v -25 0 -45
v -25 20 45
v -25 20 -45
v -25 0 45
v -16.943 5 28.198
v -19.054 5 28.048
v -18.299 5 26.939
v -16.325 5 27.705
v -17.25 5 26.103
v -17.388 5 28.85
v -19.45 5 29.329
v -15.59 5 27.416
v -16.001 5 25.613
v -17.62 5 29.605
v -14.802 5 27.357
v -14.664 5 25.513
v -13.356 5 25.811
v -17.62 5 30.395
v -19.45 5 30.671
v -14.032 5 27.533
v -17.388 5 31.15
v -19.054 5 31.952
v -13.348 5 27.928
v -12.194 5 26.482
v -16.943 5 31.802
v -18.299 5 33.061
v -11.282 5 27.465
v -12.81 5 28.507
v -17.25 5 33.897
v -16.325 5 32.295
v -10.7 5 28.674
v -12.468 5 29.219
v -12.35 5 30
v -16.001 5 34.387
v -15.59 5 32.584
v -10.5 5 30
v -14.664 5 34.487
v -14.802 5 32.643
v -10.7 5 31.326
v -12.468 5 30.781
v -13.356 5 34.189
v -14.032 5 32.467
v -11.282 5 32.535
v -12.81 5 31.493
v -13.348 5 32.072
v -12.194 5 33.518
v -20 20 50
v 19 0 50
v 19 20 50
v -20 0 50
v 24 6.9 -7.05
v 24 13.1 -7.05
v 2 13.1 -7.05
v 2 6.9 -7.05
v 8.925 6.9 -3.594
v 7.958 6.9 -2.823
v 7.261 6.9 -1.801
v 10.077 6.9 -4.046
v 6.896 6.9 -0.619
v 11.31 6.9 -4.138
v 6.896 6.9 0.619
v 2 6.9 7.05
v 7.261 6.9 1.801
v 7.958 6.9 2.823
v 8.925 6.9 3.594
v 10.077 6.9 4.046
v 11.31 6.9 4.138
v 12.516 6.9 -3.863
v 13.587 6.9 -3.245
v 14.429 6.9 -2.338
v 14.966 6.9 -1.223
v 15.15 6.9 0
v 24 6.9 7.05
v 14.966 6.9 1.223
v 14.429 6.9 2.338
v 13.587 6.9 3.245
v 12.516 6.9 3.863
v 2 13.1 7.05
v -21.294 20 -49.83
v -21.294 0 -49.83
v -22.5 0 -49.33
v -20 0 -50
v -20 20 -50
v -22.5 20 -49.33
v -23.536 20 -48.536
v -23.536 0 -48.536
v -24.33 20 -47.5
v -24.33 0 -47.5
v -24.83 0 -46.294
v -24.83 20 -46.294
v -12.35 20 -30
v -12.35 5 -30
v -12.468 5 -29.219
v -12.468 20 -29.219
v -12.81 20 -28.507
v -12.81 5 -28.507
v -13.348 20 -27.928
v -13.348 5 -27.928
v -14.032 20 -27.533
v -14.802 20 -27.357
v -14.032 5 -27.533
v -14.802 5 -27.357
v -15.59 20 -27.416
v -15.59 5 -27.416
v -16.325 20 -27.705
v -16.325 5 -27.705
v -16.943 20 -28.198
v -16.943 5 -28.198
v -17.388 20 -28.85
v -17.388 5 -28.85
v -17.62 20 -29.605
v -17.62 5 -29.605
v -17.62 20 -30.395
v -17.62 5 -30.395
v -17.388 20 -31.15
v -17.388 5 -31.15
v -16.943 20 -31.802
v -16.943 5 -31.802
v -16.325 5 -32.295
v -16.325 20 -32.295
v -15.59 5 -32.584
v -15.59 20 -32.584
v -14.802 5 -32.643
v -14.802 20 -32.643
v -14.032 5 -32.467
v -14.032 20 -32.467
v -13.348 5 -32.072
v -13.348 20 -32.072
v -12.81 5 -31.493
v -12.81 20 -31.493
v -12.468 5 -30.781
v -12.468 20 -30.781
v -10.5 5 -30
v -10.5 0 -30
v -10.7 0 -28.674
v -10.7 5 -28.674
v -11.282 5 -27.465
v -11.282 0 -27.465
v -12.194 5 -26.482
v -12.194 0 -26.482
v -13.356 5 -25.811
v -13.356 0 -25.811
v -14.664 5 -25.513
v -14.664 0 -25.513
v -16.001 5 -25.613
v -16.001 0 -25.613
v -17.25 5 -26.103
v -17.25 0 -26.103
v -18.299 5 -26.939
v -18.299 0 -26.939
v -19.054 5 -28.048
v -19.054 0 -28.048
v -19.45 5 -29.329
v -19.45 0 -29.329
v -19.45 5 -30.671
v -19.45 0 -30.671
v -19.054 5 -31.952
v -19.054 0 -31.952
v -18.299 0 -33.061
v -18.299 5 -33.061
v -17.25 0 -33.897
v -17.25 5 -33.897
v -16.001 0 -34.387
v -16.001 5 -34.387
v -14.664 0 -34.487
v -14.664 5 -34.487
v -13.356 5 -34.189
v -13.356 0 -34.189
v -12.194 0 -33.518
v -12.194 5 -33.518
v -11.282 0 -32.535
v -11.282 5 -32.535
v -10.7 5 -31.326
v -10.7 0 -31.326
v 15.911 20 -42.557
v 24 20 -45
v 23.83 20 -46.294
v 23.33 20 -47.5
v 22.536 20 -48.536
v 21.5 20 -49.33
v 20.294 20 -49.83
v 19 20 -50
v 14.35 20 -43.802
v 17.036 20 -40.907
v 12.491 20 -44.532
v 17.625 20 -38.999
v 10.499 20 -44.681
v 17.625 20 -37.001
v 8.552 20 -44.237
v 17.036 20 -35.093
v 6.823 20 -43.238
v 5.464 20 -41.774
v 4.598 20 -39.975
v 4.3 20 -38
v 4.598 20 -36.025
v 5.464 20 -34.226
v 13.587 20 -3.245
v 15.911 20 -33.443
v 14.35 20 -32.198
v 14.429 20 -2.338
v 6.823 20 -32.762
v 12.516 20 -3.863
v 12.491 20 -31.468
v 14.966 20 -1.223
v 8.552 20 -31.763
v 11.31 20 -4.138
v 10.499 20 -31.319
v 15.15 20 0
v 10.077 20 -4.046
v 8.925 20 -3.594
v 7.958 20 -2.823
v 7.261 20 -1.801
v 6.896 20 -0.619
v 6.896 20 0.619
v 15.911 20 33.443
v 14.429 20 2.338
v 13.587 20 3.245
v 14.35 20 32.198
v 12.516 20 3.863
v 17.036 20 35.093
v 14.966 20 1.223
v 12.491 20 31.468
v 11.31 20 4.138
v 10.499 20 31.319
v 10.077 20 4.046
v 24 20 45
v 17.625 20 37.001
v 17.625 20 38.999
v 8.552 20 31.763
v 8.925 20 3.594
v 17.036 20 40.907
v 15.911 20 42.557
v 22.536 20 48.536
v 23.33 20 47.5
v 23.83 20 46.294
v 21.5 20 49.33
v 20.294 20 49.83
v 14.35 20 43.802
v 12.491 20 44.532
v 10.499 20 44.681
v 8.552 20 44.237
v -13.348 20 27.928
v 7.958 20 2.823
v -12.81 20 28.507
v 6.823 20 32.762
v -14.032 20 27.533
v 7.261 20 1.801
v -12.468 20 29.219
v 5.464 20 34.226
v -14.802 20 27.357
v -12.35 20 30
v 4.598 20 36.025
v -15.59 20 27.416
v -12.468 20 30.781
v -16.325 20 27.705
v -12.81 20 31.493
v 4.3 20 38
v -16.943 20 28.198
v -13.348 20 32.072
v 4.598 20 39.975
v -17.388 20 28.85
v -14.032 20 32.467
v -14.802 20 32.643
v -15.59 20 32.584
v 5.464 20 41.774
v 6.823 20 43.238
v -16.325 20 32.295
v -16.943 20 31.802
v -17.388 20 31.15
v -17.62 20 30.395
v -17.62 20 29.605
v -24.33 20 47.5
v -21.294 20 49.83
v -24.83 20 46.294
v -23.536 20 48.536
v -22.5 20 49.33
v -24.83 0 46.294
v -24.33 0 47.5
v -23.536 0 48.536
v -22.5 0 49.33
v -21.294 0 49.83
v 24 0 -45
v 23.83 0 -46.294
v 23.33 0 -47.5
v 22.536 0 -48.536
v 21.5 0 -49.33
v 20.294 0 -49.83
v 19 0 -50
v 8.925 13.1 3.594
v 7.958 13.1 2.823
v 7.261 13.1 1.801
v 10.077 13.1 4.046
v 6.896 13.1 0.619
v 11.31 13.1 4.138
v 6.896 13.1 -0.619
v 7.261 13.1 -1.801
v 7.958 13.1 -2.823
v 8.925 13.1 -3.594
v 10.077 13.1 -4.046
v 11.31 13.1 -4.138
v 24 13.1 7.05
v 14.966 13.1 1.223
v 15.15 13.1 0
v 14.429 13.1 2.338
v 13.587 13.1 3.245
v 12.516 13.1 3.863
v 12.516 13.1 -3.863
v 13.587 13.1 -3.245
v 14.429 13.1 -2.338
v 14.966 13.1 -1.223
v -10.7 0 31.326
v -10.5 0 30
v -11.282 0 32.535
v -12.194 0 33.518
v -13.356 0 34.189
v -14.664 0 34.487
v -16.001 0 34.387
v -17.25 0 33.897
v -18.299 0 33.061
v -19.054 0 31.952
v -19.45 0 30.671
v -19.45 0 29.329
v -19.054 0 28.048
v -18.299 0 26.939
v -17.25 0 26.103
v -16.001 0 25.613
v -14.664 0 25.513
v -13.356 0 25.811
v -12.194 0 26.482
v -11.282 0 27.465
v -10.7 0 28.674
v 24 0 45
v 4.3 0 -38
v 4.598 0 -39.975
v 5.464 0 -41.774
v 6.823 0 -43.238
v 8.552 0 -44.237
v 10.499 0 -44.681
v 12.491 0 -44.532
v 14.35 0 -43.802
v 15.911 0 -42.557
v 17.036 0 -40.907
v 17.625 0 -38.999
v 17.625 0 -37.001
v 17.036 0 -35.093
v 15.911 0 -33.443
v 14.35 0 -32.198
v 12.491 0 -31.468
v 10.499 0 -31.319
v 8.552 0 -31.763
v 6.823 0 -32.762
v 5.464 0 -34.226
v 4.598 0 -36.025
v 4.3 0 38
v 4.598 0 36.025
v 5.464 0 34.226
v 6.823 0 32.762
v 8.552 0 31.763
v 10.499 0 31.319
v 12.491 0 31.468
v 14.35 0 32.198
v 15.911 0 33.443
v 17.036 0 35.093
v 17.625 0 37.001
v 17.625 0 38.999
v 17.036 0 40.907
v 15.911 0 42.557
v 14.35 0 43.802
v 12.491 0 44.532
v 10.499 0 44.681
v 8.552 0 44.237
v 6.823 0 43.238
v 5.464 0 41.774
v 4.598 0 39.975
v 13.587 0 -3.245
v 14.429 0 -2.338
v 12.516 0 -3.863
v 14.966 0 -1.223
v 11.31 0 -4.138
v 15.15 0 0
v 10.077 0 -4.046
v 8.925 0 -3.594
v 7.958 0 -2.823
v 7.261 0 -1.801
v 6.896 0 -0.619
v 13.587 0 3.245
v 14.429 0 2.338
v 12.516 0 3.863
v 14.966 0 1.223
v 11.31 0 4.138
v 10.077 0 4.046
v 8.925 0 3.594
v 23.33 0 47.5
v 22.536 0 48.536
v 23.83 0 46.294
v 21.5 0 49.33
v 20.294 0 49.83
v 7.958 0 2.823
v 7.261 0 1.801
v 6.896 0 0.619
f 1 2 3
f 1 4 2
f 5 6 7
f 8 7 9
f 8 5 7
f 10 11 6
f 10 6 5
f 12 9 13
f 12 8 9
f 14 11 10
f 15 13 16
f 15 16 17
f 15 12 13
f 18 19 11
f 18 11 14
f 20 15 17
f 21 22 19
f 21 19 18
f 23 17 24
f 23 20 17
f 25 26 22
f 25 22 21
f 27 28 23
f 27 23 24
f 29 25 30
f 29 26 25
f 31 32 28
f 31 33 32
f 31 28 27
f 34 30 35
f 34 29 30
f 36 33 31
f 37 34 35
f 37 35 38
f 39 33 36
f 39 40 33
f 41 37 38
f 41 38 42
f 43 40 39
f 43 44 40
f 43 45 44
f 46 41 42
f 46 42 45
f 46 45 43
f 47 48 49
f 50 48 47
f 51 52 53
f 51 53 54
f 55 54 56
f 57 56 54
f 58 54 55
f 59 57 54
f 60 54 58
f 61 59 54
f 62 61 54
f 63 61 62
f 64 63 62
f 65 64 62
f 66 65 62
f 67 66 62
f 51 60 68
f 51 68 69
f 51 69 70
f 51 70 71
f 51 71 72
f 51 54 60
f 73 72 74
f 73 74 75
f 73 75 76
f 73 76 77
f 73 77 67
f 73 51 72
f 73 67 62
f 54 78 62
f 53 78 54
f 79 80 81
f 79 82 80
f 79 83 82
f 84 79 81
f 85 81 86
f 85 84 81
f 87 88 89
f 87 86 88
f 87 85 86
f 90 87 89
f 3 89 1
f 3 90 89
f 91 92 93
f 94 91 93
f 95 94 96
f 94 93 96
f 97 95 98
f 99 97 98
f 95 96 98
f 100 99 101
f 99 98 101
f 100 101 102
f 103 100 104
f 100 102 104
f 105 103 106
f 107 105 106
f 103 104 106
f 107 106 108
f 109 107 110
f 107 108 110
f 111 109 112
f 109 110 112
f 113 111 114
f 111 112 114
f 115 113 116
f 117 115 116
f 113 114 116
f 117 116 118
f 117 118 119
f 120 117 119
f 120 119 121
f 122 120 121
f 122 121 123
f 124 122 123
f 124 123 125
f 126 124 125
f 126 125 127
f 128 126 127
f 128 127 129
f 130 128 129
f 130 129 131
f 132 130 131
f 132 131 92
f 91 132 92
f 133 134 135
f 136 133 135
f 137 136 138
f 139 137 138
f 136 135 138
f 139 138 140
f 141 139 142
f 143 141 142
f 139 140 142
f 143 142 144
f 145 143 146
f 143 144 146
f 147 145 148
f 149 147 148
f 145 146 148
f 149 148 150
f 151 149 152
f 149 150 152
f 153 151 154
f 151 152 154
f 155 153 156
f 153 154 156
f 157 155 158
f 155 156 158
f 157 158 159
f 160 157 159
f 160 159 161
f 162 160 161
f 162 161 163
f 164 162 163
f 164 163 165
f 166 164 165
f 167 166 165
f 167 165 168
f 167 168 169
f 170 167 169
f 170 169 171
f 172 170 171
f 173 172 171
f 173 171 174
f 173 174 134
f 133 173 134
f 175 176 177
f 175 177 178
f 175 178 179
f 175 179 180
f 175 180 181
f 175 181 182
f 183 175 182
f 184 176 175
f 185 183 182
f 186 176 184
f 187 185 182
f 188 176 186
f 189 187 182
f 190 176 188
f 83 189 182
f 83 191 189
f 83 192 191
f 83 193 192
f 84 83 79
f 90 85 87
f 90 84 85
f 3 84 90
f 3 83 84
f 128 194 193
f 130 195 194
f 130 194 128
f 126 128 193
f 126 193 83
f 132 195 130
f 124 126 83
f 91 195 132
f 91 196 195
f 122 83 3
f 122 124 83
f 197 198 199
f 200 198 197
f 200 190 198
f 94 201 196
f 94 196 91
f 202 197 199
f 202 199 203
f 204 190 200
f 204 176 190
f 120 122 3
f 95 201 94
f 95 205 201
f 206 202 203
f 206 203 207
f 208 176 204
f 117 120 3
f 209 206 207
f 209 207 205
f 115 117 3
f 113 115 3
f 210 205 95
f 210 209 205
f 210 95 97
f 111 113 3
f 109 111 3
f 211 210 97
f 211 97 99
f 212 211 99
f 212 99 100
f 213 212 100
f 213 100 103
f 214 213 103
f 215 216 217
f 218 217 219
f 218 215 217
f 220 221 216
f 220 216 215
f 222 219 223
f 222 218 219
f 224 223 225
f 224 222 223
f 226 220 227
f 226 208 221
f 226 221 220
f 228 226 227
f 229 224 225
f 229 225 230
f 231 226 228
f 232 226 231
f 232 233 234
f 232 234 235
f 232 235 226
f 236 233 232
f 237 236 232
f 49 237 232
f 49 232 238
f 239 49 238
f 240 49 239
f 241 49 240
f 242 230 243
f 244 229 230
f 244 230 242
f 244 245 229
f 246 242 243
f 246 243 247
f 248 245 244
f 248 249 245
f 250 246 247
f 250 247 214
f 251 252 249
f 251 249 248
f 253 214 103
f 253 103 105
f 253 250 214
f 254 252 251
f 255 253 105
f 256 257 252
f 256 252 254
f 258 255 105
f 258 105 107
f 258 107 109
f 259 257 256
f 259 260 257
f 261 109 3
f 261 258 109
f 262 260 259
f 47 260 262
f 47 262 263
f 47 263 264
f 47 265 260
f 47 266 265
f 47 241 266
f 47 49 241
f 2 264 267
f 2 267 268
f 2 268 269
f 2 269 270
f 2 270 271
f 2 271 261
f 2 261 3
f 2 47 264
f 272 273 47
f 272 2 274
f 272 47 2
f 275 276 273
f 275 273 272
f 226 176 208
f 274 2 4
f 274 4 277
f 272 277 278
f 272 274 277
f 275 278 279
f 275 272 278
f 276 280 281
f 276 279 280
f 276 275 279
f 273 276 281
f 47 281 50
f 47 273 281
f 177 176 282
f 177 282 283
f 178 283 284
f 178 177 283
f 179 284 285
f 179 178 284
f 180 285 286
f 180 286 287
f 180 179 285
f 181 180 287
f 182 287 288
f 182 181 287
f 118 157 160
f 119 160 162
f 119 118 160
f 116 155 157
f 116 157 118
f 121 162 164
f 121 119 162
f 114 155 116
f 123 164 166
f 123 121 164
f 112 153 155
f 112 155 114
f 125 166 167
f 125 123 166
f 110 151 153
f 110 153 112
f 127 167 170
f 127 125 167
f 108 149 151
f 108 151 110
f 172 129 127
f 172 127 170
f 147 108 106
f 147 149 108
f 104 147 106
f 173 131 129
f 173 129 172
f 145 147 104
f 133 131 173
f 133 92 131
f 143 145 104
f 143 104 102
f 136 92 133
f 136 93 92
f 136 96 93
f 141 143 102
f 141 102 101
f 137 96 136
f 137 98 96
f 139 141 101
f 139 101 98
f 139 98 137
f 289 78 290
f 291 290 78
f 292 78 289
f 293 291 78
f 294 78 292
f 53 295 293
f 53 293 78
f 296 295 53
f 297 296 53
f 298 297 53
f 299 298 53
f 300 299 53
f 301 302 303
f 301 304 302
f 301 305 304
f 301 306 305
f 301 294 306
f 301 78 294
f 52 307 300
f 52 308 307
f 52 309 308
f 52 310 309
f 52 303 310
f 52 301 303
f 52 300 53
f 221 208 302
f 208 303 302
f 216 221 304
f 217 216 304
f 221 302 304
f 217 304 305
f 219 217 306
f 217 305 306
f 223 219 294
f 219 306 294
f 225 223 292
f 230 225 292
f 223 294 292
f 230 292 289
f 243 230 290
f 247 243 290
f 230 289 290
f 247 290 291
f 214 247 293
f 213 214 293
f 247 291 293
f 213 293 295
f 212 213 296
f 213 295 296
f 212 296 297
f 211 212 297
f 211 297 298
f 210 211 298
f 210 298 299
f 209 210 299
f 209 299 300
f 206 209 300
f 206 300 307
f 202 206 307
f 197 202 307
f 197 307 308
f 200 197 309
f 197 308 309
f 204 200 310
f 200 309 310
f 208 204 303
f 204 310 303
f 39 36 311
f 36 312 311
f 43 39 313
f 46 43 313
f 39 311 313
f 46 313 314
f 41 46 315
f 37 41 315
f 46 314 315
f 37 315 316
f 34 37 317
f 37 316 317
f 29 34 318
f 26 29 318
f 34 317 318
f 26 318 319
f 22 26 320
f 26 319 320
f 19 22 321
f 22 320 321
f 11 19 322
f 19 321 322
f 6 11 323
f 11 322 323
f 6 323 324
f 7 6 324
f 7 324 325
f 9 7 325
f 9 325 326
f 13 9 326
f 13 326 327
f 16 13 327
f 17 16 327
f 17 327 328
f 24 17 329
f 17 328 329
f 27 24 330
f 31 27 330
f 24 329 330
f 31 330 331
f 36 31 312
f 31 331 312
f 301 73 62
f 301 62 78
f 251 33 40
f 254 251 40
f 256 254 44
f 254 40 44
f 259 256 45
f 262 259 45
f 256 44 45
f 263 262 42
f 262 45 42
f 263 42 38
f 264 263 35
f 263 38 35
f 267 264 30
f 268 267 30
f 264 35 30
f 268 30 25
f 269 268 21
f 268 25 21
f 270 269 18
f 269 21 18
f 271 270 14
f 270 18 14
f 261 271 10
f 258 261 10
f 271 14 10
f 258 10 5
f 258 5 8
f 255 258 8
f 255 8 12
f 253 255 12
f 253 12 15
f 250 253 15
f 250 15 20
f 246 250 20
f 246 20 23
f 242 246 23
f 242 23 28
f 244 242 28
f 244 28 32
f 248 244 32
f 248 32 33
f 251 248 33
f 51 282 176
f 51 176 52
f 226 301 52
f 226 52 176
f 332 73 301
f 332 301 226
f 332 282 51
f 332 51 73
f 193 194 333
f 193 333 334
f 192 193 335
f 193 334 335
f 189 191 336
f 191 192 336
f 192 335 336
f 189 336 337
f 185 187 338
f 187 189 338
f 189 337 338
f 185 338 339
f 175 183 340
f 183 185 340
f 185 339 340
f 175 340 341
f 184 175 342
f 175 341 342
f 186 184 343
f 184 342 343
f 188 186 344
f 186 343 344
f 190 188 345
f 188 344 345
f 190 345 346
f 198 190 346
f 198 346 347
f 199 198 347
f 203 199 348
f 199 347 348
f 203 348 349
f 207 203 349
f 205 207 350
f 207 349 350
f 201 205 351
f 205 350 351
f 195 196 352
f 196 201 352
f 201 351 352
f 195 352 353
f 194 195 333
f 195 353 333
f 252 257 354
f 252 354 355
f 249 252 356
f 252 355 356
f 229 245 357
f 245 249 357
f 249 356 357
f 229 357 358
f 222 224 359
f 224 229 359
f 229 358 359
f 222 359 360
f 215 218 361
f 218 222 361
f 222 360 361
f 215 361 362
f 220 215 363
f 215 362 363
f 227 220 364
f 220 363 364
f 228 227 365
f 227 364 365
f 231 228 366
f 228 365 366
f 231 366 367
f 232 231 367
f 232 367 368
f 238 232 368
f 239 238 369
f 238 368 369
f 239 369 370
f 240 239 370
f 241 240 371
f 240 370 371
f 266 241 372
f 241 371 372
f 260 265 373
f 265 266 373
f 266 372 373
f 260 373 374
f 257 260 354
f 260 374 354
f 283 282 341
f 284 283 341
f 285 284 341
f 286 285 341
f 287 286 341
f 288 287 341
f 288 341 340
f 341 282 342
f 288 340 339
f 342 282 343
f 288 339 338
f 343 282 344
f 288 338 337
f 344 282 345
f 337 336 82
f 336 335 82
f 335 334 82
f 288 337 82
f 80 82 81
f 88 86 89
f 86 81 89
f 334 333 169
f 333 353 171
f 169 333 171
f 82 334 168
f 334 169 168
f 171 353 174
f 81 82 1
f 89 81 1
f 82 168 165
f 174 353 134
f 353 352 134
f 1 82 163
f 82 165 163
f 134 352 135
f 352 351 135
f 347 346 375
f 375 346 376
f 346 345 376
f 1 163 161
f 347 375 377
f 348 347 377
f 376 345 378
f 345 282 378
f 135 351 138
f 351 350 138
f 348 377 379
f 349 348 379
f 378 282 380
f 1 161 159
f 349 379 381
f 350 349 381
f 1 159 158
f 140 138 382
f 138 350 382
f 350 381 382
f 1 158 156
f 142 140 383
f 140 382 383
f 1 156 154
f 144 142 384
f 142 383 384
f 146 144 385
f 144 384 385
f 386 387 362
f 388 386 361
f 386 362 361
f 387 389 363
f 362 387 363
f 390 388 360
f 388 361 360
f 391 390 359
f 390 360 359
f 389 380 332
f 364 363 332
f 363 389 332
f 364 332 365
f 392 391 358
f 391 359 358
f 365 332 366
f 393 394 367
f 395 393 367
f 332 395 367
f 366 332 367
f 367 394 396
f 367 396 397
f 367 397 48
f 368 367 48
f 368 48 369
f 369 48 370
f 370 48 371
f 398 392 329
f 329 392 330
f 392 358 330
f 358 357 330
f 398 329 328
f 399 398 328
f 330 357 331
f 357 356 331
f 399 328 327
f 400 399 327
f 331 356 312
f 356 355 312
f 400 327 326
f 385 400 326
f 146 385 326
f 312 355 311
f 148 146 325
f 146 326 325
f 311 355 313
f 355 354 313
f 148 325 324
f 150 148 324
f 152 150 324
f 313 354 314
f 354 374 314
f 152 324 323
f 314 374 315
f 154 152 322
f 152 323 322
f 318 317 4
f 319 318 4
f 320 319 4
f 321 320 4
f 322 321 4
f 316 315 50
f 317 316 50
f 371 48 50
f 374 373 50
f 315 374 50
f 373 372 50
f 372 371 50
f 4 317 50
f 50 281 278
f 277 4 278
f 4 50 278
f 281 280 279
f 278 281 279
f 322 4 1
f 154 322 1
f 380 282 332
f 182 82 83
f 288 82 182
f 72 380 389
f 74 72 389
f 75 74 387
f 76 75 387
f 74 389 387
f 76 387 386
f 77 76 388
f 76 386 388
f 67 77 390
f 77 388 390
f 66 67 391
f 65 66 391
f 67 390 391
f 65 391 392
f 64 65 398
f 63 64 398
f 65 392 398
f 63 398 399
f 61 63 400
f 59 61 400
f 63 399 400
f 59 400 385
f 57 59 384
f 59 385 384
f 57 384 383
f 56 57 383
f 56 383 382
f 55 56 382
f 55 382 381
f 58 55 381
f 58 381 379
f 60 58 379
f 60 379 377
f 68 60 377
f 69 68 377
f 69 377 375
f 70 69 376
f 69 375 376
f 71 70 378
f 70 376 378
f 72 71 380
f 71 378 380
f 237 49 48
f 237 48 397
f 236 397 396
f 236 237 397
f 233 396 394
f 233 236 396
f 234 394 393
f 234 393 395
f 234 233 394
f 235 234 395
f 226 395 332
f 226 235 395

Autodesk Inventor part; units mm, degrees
ref_plane "YZ Plane" through (0, 0, 0) normal (1, 0, 0) x (0, 1, 0)
ref_plane "XZ Plane" through (0, 0, 0) normal (0, 1, 0) x (-1, 0, 0)
ref_plane "XY Plane" through (0, 0, 0) normal (0, 0, 1) x (1, 0, 0)
sketch "Sketch1" plane through (0, 0, 0) normal (0, 1, 0) x (-1, 0, 0)
  line L0 (-25, 50) -> (25, 50)
  line L1 (25, 50) -> (25, -50)
  line L2 (25, -50) -> (-25, -50)
  line L3 (-25, -50) -> (-25, 50)
  line L4 (-25, 50) -> (25, -50) construction
  line L5 (25, 50) -> (-25, -50) construction
  circle A0 centre (-11, 38) radius 6.7
  circle A1 centre (-11, -38) radius 6.7
  point P0 (0, 0)
  dimension "d0" = 13.4
  dimension "d1" = 100
  dimension "d2" = 50
  dimension "d4" = 12
  dimension "d5" = 12
  dimension "d6" = 14
extrude "Extrusion1" add sketch "Sketch1" along normal blind 20
sketch "Sketch2" plane through (0, 0, 0) normal (0, -1, 0) x (1, 0, 0)
  circle A0 centre (-15, -30) radius 2.65
  circle A1 centre (-15, 30) radius 2.65
  line L0 (-25, -50) -> (-25, 50) projected
  line L1 (25, -50) -> (-25, -50) projected
  line L2 (-25, 50) -> (25, 50) projected
  point P0 (0, 0)
  dimension "d9" = 5.3
  dimension "d10" = 10
  dimension "d11" = 20
  dimension "d12" = 20
  dimension "d13" = 10
extrude "Extrusion2" cut sketch "Sketch2" against normal through all
sketch "Sketch3" plane through (0, 0, 0) normal (0, -1, 0) x (1, 0, 0)
  line L0 (25, 50) -> (25, -50) projected
  line L1 (-25, 50) -> (25, 50) projected
  line L2 (25, -50) -> (24, -50)
  line L3 (24, -50) -> (24, 50)
  line L4 (24, 50) -> (25, 50)
  line L5 (25, 50) -> (25, -50)
  point P0 (0, 0)
  dimension "d16" = 1
extrude "Extrusion3" cut sketch "Sketch3" against normal through all
fillet "Fillet1" radius 5 2 edges at (-25, 10, 50) (-25, 10, -50)
sketch "Sketch4" plane through (0, 0, 0) normal (0, -1, 0) x (1, 0, 0)
  circle A0 centre (-15, -30) radius 2.65 projected
  circle A1 centre (-15, -30) radius 4.1
  circle A2 centre (-15, 30) radius 2.65 projected
  circle A3 centre (-15, 30) radius 4.1
  line L0 (-19.7343, -30) -> (-17.3671, -25.9)
  line L1 (-17.3671, -25.9) -> (-12.6329, -25.9)
  line L2 (-12.6329, -25.9) -> (-10.2657, -30)
  line L3 (-10.2657, -30) -> (-12.6329, -34.1)
  line L4 (-12.6329, -34.1) -> (-17.3671, -34.1)
  line L5 (-17.3671, -34.1) -> (-19.7343, -30)
  line L6 (-19.7311, 29.8275) -> (-17.5149, 34.011)
  line L7 (-17.5149, 34.011) -> (-12.7838, 34.1835)
  line L8 (-12.7838, 34.1835) -> (-10.2689, 30.1725)
  line L9 (-10.2689, 30.1725) -> (-12.4851, 25.989)
  line L10 (-12.4851, 25.989) -> (-17.2162, 25.8165)
  line L11 (-17.2162, 25.8165) -> (-19.7311, 29.8275)
  point P0 (0, 0)
  dimension "d20" = 8.2
  dimension "d21" = 8.2
extrude "Extrusion4" [suppressed]
sketch "Sketch5" plane through (0, 0, 0) normal (0, -1, 0) x (1, 0, 0)
  circle A0 centre (11, 0) radius 4.15
  circle A1 centre (11, -38) radius 6.7 projected
  point P0 (0, 0)
  dimension "d24" = 8.3
extrude "Extrusion5" cut sketch "Sketch5" against normal through all contours A0
sketch "Sketch6" plane through (24, 0, 50) normal (1, 0, 0) x (0, 0, -1)
  line L0 (57.05, 6.9) -> (42.95, 6.9)
  line L1 (42.95, 6.9) -> (42.95, 13.1)
  line L2 (42.95, 13.1) -> (57.05, 13.1)
  line L3 (57.05, 13.1) -> (57.05, 6.9)
  line L4 (57.05, 6.9) -> (42.95, 13.1) construction
  line L5 (42.95, 6.9) -> (57.05, 13.1) construction
  line L6 (0, 20) -> (100, 20) projected
  point P0 (50, 0)
  point P1 (50, 10)
  dimension "d27" = 10
  dimension "d28" = 14.1
  dimension "d29" = 6.2
extrude "Extrusion6" cut sketch "Sketch6" against normal blind 22
fillet "Fillet2" radius 5 2 edges at (24, 10, -50) (24, 10, 50)
sketch "Sketch7" plane through (0, 0, 0) normal (0, -1, 0) x (1, 0, 0)
  circle A0 centre (-15, -30) radius 2.65 projected
  circle A1 centre (-15, -30) radius 4.5
  circle A2 centre (-15, 30) radius 2.65 projected
  circle A3 centre (-15, 30) radius 4.5
  point P0 (0, 0)
  dimension "d35" = 9
extrude "Extrusion7" cut sketch "Sketch7" against normal blind 5 contours A1 | A2 | A3
properties part number "Movingjaw"
